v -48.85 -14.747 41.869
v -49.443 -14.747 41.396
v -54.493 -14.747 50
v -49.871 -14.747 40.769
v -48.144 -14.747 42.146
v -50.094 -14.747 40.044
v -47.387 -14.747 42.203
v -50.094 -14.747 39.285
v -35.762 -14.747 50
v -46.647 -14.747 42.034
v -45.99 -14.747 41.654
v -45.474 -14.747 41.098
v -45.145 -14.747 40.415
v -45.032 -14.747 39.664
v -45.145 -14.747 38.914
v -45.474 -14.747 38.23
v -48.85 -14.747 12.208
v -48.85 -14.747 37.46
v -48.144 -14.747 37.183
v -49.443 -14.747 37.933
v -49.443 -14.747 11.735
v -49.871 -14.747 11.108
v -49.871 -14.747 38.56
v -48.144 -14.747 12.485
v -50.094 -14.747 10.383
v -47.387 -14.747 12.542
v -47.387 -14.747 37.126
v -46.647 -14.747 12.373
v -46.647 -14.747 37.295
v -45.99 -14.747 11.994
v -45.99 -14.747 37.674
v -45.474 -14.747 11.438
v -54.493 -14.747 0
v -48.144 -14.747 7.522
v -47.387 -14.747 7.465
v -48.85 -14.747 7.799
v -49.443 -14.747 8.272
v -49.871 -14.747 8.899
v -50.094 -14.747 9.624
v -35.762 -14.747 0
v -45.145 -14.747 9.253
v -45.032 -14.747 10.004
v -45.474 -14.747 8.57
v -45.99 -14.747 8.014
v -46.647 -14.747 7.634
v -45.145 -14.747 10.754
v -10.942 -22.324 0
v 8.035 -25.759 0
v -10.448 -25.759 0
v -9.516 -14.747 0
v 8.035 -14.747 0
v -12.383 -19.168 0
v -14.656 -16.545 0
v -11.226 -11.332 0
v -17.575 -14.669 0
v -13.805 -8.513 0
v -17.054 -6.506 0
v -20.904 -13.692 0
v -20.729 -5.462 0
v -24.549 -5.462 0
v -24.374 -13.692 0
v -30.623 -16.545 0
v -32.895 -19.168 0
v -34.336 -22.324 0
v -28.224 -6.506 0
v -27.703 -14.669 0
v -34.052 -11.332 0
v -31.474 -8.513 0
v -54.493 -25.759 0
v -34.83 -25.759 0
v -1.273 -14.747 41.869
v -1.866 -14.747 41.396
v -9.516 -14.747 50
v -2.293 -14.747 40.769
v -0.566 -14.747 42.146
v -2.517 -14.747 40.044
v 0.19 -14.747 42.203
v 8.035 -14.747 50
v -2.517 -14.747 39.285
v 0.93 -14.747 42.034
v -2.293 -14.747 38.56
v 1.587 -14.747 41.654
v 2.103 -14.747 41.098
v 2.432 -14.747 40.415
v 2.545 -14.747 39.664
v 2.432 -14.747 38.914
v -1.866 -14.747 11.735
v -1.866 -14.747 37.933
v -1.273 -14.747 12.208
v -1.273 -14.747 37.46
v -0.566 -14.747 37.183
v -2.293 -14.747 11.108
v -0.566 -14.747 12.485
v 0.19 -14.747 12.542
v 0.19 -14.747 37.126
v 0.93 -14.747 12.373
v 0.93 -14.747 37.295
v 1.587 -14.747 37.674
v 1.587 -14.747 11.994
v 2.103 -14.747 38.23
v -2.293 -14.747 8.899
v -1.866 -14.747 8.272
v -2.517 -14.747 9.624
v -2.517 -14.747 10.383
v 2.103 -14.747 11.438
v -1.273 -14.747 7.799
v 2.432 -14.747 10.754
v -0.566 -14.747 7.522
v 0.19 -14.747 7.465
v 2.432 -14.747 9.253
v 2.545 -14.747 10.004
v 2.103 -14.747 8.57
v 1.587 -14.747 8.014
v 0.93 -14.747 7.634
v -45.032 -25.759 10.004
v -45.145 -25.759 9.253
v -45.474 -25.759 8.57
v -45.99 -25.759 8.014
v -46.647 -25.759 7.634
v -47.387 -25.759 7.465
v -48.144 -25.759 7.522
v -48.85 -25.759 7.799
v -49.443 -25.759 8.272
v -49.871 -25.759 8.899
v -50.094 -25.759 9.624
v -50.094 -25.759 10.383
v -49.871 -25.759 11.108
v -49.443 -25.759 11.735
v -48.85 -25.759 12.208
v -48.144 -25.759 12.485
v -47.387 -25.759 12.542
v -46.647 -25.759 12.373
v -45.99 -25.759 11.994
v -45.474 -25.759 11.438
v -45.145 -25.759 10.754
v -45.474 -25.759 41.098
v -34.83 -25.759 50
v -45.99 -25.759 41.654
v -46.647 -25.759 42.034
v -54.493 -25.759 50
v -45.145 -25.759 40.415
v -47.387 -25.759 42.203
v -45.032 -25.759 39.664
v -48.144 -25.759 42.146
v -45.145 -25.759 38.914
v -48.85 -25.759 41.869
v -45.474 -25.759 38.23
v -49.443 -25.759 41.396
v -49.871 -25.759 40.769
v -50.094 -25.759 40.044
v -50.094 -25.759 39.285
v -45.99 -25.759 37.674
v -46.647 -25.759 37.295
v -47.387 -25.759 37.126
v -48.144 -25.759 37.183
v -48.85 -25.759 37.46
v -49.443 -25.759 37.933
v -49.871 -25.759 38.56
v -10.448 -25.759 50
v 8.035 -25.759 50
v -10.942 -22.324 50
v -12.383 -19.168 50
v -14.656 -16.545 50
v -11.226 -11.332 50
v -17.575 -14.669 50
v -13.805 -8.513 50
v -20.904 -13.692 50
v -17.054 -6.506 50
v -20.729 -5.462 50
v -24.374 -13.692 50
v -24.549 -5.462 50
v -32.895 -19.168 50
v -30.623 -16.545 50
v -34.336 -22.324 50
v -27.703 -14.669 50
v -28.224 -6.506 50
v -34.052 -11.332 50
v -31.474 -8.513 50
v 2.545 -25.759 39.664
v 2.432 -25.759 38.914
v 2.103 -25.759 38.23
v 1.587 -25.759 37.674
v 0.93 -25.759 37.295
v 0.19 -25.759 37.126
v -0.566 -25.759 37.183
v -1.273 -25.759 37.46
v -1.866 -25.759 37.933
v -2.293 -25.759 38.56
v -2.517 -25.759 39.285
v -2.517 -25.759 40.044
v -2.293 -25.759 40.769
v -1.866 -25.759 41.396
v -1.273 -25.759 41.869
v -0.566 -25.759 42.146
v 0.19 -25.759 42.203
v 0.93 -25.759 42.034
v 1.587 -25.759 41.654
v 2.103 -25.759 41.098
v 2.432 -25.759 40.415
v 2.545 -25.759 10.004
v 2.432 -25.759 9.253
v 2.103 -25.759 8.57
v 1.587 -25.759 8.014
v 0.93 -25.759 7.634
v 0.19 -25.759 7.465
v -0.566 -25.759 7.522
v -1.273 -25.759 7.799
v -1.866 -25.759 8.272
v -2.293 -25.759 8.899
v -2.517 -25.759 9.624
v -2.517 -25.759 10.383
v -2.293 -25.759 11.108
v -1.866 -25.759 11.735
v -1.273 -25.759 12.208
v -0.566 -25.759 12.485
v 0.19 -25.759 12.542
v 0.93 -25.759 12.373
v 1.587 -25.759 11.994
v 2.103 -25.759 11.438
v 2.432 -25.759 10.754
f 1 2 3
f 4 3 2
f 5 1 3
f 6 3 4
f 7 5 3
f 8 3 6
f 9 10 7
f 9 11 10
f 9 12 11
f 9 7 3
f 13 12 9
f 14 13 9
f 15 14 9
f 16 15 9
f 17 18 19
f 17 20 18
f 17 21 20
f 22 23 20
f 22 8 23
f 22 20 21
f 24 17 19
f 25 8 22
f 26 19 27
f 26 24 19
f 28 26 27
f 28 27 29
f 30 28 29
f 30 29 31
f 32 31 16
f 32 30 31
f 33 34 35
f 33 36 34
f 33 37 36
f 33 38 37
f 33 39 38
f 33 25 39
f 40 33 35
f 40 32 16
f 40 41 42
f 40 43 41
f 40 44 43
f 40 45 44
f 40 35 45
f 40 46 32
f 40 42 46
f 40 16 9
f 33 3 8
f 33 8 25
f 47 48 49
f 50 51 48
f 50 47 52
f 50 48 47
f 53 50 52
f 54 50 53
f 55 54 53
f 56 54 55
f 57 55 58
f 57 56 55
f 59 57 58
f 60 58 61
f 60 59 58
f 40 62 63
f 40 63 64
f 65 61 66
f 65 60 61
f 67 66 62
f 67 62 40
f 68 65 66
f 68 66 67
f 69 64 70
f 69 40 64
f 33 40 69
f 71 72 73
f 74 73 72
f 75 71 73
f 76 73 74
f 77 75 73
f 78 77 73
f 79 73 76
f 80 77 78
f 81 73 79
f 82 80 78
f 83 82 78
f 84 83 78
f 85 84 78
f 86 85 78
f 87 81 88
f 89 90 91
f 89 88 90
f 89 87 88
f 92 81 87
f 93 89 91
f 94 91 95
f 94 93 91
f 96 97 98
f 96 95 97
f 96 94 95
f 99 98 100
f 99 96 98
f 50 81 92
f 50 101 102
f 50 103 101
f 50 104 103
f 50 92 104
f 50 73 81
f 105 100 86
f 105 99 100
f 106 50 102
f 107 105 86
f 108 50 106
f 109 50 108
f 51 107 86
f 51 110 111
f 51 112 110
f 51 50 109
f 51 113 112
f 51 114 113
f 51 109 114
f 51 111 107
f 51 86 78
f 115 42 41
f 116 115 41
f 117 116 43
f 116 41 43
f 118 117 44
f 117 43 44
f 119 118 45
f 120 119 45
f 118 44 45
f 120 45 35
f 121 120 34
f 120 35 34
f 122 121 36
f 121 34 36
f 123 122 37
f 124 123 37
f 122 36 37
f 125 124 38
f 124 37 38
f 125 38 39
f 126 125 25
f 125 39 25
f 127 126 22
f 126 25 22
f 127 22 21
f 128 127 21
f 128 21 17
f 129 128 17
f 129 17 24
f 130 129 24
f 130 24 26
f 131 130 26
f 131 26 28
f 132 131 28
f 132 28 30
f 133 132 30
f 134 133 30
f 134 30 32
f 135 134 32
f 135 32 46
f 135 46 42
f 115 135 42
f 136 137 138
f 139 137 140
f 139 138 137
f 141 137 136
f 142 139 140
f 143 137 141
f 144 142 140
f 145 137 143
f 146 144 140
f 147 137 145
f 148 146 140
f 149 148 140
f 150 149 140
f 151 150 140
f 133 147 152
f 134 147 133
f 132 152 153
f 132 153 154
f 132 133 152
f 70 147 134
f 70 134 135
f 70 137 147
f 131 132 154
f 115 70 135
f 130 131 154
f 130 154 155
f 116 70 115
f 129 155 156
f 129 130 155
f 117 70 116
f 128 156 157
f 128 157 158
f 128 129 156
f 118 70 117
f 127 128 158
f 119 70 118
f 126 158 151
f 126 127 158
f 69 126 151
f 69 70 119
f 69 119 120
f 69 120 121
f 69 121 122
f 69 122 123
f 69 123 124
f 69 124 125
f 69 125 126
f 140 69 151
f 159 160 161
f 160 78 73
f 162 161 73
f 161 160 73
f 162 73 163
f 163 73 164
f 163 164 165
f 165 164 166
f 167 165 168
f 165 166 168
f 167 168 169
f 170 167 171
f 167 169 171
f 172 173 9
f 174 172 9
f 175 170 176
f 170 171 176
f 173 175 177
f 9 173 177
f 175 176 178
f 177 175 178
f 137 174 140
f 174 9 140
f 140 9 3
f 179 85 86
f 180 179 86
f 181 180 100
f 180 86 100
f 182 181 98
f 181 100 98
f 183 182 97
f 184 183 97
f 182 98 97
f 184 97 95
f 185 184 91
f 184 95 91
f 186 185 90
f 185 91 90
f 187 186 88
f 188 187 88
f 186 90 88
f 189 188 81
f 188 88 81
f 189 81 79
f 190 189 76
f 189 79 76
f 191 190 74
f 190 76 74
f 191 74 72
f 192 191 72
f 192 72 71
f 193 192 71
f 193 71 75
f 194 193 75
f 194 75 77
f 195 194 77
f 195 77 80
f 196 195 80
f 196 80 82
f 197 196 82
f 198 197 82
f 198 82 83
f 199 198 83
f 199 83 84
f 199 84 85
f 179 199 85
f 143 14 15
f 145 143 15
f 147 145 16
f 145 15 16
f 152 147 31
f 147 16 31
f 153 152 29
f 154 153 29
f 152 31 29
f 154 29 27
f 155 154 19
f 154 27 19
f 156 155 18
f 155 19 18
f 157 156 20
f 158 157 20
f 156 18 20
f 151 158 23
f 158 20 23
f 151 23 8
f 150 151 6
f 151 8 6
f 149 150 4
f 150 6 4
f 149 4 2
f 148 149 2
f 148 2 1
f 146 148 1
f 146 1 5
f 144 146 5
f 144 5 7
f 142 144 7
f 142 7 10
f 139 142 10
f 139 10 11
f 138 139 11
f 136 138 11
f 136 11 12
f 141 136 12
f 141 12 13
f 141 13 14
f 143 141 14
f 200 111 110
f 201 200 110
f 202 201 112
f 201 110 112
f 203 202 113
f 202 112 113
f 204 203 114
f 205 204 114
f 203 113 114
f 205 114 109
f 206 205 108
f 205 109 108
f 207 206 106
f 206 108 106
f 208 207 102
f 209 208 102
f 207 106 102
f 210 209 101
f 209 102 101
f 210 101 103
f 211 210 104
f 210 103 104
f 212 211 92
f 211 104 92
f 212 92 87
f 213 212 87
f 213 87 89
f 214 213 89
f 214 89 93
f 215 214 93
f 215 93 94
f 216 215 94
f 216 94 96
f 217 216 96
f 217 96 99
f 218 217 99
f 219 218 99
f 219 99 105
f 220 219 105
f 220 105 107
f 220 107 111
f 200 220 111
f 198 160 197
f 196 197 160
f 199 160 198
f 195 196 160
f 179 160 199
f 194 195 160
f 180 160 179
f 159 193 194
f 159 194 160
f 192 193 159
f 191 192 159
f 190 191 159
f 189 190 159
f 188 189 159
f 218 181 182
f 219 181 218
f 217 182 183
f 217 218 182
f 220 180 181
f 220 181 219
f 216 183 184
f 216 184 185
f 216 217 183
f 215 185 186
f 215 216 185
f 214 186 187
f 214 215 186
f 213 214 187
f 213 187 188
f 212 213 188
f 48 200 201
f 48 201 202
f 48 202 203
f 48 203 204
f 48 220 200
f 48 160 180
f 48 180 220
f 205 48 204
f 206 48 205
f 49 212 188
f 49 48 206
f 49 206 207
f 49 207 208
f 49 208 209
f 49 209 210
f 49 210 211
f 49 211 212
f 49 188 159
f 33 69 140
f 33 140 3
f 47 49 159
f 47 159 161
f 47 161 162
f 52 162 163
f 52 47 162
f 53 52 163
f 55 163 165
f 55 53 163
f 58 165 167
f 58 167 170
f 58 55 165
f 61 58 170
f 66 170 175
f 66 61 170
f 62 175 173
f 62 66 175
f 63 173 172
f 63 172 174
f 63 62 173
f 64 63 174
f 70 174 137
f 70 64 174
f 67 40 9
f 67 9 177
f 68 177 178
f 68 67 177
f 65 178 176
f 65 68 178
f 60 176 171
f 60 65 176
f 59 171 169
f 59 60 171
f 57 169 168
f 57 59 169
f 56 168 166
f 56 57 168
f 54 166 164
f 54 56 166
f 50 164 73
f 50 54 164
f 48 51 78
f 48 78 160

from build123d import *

# Parameters (mm, degrees)
BOSS_EXTRUDE1_DEPTH = 50
SKETCH2_R           = 2.545489134
CUT_EXTRUDE1_DEPTH  = 50


with BuildPart() as part:
    # Sketch1 → Boss-Extrude1 (new body)
    with BuildSketch(Plane.XY):
        with BuildLine():
            Line((-9.516237222, -14.74726776), (8.035250311, -14.74726776))
            Line((8.035250311, -14.74726776), (8.035250311, -25.75856102))
            Line((8.035250311, -25.75856102), (-10.447991948, -25.75856102))
            ThreePointArc((-10.447991948, -25.75856102), (-22.639066629, -13.567486339), (-34.83014131, -25.75856102))
            Line((-34.83014131, -25.75856102), (-54.49316499, -25.75856102))
            Line((-54.49316499, -25.75856102), (-54.49316499, -14.74726776))
            Line((-54.49316499, -14.74726776), (-35.761896036, -14.74726776))
            ThreePointArc((-35.761896036, -14.74726776), (-22.639066629, -5.330023584), (-9.516237222, -14.74726776))
        make_face()
    extrude(amount=BOSS_EXTRUDE1_DEPTH)

    # Sketch2 → Cut-Extrude1 (cut)
    with BuildSketch(Plane(origin=(0, 0, 0), x_dir=(1, 0, 0), z_dir=(0, 1, 0))):
        with Locations((-47.57711427, -10.003748799)):
            Circle(SKETCH2_R)
        with Locations((0, -10.003748799)):
            Circle(SKETCH2_R)
        with Locations((0, -39.664230879)):
            Circle(SKETCH2_R)
        with Locations((-47.57711427, -39.664230879)):
            Circle(SKETCH2_R)
    extrude(amount=-CUT_EXTRUDE1_DEPTH, mode=Mode.SUBTRACT)


solid = part.part
